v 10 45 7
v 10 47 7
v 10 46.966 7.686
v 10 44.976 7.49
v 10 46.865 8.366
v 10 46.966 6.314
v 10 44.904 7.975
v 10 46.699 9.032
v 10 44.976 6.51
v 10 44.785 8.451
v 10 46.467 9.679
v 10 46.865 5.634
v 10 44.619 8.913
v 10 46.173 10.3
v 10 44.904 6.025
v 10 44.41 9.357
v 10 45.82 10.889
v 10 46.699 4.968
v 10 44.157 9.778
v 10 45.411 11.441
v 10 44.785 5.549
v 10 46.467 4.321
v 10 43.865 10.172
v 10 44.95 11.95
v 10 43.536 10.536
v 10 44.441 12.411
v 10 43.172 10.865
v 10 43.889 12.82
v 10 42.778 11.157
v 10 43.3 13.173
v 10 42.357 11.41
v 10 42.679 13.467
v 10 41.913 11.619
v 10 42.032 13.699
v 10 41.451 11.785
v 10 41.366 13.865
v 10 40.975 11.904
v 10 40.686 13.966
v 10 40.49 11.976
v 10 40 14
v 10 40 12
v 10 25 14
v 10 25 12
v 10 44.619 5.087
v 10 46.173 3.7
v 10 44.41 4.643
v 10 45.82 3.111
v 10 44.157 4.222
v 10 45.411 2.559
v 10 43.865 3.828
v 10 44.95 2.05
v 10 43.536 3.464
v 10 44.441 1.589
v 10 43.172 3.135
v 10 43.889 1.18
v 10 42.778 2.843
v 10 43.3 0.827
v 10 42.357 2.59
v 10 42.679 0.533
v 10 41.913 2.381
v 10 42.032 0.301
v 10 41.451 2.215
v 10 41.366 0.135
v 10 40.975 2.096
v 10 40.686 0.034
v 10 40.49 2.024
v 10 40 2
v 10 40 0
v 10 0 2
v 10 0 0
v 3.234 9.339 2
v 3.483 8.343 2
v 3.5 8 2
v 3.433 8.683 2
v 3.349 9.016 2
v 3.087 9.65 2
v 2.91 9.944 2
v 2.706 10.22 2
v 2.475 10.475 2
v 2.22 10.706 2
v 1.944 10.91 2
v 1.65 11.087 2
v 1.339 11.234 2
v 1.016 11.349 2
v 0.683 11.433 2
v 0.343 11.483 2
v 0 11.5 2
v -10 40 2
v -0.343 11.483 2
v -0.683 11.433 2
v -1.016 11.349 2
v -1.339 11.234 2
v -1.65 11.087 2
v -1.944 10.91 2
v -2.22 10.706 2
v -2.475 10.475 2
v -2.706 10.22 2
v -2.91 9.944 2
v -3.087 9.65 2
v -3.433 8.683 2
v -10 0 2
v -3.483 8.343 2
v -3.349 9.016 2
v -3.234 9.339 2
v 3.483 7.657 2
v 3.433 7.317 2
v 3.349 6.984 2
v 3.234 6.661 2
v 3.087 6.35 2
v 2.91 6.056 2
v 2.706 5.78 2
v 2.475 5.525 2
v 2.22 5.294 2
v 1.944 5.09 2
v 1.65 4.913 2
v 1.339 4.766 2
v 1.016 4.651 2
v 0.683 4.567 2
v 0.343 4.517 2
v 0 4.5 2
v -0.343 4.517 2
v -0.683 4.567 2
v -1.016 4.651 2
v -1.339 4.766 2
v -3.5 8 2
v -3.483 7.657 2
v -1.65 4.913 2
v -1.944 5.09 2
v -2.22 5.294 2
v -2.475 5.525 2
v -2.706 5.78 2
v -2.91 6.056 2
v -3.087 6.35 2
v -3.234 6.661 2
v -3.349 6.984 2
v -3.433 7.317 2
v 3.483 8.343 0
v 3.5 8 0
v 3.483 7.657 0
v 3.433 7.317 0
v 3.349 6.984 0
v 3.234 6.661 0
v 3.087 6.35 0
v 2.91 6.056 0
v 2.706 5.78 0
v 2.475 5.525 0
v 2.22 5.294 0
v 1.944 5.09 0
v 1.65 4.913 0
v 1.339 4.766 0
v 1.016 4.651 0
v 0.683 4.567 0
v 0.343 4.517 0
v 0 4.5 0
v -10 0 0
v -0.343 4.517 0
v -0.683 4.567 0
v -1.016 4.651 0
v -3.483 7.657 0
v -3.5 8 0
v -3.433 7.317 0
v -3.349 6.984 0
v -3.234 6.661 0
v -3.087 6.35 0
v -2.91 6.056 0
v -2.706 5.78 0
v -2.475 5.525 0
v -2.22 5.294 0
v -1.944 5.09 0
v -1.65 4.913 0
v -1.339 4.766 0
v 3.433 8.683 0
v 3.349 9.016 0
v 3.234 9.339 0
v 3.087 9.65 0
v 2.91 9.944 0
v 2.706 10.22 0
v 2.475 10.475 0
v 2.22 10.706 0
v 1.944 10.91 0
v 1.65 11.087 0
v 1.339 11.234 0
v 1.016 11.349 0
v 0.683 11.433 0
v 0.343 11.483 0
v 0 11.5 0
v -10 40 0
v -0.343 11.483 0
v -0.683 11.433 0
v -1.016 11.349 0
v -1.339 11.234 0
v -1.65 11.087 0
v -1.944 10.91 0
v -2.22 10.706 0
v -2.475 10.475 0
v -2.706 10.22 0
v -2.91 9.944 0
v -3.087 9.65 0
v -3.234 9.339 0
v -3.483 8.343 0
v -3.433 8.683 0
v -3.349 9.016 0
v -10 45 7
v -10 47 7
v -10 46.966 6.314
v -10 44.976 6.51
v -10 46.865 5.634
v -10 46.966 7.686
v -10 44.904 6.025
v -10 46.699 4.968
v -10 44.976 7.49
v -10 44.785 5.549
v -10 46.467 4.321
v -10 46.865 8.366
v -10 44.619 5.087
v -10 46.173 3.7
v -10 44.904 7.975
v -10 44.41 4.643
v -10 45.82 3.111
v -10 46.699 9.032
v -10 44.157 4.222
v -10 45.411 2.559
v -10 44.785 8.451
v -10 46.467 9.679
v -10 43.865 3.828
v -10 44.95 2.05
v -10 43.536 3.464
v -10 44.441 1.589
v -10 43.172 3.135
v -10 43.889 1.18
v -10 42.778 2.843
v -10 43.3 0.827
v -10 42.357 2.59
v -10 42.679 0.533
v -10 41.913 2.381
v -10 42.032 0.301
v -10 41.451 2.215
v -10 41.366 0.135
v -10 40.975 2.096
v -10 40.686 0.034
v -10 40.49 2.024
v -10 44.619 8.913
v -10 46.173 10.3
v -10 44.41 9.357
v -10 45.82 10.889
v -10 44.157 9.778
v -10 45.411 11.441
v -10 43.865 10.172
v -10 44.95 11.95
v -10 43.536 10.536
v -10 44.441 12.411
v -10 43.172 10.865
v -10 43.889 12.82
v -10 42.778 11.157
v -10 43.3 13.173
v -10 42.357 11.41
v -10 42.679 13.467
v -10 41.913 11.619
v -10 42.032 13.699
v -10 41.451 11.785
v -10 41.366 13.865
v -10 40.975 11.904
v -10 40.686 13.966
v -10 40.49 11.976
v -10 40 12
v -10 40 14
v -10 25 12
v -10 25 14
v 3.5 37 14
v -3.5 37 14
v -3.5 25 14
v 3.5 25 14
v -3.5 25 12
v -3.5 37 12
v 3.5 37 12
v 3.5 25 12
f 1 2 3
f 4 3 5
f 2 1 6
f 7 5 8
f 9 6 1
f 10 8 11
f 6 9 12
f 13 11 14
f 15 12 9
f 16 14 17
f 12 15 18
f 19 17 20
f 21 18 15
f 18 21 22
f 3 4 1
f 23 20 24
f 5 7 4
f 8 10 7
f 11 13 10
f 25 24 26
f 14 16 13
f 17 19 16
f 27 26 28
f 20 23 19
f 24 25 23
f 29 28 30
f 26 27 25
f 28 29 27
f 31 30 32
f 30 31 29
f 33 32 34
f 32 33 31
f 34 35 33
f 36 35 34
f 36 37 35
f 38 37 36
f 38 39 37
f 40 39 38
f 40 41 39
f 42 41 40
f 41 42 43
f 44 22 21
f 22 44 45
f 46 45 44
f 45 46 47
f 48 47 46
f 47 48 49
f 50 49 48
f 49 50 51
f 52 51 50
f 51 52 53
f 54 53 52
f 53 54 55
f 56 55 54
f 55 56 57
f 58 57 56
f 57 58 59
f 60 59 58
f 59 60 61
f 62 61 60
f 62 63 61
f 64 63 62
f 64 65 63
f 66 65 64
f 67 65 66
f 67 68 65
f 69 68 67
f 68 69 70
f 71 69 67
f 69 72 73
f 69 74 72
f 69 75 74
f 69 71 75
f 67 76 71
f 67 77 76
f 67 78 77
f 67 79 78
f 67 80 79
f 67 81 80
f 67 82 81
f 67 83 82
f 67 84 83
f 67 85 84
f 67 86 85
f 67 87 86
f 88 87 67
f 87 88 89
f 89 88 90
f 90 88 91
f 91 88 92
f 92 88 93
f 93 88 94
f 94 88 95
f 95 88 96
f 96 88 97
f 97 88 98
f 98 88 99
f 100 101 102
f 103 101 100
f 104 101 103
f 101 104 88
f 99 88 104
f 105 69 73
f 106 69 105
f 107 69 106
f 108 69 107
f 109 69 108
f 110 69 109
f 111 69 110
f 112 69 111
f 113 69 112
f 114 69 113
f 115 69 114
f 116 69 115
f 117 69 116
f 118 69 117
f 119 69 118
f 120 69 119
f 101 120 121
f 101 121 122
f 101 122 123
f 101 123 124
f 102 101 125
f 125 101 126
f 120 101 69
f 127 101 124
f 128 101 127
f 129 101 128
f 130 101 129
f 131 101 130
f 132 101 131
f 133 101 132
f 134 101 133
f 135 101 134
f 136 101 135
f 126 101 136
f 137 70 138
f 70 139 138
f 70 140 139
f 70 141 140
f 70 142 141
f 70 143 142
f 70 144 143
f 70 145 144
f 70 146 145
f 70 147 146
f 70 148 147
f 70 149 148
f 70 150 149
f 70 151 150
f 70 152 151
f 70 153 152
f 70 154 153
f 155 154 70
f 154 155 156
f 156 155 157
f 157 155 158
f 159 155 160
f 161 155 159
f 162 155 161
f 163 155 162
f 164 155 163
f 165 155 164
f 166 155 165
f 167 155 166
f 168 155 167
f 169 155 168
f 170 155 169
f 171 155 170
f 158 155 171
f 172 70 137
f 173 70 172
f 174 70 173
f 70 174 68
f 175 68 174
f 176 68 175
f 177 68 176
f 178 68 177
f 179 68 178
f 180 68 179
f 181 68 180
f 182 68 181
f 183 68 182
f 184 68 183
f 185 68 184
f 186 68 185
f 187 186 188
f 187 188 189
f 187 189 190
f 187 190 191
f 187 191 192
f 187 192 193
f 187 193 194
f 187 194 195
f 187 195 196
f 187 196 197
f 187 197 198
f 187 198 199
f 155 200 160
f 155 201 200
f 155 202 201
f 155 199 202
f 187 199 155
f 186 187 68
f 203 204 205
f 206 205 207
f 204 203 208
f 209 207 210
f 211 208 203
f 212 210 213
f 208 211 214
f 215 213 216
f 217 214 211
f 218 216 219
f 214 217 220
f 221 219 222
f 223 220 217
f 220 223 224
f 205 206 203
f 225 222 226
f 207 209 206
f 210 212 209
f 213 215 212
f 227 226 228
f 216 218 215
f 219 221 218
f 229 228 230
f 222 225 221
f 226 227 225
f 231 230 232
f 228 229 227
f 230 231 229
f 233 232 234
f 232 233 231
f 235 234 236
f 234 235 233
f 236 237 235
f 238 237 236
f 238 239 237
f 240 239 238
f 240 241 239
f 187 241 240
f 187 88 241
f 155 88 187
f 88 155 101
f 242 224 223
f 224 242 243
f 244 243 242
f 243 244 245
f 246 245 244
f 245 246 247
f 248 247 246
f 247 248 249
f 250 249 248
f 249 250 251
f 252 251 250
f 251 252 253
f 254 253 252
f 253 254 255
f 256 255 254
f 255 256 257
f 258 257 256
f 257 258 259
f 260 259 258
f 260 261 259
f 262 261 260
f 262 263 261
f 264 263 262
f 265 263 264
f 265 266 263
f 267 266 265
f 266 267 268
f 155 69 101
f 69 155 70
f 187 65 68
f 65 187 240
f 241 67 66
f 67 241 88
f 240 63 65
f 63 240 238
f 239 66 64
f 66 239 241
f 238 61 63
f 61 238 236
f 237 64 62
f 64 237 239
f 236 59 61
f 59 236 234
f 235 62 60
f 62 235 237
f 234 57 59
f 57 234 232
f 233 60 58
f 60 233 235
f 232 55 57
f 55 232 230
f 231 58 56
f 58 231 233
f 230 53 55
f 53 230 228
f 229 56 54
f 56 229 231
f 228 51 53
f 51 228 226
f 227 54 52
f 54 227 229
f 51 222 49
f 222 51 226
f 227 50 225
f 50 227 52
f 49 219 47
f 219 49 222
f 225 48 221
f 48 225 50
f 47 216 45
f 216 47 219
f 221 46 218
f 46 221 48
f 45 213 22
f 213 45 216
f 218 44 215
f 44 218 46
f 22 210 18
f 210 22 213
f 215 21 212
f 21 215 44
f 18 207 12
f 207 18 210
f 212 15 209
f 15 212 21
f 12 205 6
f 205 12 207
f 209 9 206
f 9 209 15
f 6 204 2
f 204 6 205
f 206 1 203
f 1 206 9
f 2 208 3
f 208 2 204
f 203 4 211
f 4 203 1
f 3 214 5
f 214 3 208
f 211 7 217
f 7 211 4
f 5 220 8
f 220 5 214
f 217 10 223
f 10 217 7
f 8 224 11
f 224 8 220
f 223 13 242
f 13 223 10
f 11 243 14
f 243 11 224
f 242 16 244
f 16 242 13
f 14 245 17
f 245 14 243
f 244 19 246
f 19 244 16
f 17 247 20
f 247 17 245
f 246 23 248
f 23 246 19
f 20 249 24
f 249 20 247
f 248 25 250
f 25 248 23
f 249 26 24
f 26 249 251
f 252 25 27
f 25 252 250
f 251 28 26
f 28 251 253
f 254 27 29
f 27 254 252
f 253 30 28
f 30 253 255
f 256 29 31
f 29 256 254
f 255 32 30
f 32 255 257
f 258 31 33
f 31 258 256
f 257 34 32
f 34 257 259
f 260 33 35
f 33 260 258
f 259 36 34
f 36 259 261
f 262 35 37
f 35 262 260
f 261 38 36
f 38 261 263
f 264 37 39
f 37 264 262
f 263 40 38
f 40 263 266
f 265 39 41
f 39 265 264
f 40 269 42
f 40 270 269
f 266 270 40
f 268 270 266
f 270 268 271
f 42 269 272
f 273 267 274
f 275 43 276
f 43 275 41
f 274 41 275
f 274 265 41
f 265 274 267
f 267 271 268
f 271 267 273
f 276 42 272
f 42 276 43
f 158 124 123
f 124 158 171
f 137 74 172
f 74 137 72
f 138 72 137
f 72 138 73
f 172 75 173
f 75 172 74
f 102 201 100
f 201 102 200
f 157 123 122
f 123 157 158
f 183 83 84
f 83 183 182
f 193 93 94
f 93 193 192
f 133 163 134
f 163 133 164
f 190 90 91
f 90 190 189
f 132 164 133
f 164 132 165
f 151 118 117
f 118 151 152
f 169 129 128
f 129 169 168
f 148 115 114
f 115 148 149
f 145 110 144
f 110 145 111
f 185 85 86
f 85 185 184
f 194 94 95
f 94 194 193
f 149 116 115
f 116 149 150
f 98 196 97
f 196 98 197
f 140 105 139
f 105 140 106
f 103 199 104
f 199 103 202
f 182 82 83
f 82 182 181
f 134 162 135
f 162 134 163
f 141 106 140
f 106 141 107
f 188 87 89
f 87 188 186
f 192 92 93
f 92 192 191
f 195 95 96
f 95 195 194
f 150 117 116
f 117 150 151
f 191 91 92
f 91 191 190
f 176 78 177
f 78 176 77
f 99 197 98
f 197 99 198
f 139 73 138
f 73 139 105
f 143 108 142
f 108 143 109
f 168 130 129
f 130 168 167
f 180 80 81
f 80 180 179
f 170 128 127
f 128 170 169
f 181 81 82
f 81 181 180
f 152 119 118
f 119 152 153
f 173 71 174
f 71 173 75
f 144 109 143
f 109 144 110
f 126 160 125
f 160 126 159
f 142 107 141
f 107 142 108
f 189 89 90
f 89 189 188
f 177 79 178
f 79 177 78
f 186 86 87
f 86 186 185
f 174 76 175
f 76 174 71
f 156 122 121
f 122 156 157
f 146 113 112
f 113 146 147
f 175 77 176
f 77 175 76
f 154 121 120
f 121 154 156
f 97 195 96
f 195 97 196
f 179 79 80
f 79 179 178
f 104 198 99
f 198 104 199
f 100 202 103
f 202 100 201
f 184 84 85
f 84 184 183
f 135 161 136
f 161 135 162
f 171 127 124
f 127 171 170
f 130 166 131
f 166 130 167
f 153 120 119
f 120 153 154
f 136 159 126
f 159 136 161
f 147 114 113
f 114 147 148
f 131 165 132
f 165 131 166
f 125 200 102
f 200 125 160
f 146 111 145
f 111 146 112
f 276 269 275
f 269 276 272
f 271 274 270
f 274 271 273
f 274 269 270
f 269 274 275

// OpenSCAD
// Parametric Hanging Clip
// ---------------------------------------------------------
// Dimensions are in millimeters. Adjust these variables 
// to change the shape and size of the clip.
// ---------------------------------------------------------

// Main body dimensions
width = 20;           // Width of the flat bar
length = 40;          // Length of the main straight base part
thickness = 2;        // Thickness of the material

// Hole dimensions
hole_diameter = 7;
hole_offset = 8;      // Distance from the bottom edge to the center of the hole

// Hook (180 degree bend) dimensions
hook_inner_radius = 5;
hook_return_length = 15; // Length of the straight part that bends back

// Slot dimensions (the cutout in the hook part)
slot_width = 7;
slot_length = 12;

// ---------------------------------------------------------
// Rendering variables
$fn = 64;             // Curve resolution
hook_outer_radius = hook_inner_radius + thickness;

module part() {
    difference() {
        union() {
            // 1. Main Base Body
            // Centered on X, starting at Y=0, Z goes from 0 to thickness
            translate([-width/2, 0, 0])
                cube([width, length, thickness]);
            
            // 2. 180 Degree Bend
            // Center is at the end of the base: Y = length, Z = hook_outer_radius
            translate([0, length, hook_outer_radius])
                rotate([0, 90, 0])
                rotate_extrude(angle=180)
                    translate([hook_inner_radius, -width/2])
                        square([thickness, width]);
                        
            // 3. Return Hook Part (the straight section bending back)
            // Starts at Y = length, extends backwards to length - hook_return_length
            translate([-width/2, length - hook_return_length, hook_inner_radius*2 + thickness])
                cube([width, hook_return_length, thickness]);
        }
        
        // Subtract Base Hole
        translate([0, hole_offset, -1])
            cylinder(d=hole_diameter, h=thickness + 2);
            
        // Subtract Hook Slot
        // Cut into the return part of the hook
        translate([-slot_width/2, length - hook_return_length - 1, hook_inner_radius*2 + thickness - 1])
            cube([slot_width, slot_length + 1, thickness + 2]);
    }
}

// Render the part
part();
